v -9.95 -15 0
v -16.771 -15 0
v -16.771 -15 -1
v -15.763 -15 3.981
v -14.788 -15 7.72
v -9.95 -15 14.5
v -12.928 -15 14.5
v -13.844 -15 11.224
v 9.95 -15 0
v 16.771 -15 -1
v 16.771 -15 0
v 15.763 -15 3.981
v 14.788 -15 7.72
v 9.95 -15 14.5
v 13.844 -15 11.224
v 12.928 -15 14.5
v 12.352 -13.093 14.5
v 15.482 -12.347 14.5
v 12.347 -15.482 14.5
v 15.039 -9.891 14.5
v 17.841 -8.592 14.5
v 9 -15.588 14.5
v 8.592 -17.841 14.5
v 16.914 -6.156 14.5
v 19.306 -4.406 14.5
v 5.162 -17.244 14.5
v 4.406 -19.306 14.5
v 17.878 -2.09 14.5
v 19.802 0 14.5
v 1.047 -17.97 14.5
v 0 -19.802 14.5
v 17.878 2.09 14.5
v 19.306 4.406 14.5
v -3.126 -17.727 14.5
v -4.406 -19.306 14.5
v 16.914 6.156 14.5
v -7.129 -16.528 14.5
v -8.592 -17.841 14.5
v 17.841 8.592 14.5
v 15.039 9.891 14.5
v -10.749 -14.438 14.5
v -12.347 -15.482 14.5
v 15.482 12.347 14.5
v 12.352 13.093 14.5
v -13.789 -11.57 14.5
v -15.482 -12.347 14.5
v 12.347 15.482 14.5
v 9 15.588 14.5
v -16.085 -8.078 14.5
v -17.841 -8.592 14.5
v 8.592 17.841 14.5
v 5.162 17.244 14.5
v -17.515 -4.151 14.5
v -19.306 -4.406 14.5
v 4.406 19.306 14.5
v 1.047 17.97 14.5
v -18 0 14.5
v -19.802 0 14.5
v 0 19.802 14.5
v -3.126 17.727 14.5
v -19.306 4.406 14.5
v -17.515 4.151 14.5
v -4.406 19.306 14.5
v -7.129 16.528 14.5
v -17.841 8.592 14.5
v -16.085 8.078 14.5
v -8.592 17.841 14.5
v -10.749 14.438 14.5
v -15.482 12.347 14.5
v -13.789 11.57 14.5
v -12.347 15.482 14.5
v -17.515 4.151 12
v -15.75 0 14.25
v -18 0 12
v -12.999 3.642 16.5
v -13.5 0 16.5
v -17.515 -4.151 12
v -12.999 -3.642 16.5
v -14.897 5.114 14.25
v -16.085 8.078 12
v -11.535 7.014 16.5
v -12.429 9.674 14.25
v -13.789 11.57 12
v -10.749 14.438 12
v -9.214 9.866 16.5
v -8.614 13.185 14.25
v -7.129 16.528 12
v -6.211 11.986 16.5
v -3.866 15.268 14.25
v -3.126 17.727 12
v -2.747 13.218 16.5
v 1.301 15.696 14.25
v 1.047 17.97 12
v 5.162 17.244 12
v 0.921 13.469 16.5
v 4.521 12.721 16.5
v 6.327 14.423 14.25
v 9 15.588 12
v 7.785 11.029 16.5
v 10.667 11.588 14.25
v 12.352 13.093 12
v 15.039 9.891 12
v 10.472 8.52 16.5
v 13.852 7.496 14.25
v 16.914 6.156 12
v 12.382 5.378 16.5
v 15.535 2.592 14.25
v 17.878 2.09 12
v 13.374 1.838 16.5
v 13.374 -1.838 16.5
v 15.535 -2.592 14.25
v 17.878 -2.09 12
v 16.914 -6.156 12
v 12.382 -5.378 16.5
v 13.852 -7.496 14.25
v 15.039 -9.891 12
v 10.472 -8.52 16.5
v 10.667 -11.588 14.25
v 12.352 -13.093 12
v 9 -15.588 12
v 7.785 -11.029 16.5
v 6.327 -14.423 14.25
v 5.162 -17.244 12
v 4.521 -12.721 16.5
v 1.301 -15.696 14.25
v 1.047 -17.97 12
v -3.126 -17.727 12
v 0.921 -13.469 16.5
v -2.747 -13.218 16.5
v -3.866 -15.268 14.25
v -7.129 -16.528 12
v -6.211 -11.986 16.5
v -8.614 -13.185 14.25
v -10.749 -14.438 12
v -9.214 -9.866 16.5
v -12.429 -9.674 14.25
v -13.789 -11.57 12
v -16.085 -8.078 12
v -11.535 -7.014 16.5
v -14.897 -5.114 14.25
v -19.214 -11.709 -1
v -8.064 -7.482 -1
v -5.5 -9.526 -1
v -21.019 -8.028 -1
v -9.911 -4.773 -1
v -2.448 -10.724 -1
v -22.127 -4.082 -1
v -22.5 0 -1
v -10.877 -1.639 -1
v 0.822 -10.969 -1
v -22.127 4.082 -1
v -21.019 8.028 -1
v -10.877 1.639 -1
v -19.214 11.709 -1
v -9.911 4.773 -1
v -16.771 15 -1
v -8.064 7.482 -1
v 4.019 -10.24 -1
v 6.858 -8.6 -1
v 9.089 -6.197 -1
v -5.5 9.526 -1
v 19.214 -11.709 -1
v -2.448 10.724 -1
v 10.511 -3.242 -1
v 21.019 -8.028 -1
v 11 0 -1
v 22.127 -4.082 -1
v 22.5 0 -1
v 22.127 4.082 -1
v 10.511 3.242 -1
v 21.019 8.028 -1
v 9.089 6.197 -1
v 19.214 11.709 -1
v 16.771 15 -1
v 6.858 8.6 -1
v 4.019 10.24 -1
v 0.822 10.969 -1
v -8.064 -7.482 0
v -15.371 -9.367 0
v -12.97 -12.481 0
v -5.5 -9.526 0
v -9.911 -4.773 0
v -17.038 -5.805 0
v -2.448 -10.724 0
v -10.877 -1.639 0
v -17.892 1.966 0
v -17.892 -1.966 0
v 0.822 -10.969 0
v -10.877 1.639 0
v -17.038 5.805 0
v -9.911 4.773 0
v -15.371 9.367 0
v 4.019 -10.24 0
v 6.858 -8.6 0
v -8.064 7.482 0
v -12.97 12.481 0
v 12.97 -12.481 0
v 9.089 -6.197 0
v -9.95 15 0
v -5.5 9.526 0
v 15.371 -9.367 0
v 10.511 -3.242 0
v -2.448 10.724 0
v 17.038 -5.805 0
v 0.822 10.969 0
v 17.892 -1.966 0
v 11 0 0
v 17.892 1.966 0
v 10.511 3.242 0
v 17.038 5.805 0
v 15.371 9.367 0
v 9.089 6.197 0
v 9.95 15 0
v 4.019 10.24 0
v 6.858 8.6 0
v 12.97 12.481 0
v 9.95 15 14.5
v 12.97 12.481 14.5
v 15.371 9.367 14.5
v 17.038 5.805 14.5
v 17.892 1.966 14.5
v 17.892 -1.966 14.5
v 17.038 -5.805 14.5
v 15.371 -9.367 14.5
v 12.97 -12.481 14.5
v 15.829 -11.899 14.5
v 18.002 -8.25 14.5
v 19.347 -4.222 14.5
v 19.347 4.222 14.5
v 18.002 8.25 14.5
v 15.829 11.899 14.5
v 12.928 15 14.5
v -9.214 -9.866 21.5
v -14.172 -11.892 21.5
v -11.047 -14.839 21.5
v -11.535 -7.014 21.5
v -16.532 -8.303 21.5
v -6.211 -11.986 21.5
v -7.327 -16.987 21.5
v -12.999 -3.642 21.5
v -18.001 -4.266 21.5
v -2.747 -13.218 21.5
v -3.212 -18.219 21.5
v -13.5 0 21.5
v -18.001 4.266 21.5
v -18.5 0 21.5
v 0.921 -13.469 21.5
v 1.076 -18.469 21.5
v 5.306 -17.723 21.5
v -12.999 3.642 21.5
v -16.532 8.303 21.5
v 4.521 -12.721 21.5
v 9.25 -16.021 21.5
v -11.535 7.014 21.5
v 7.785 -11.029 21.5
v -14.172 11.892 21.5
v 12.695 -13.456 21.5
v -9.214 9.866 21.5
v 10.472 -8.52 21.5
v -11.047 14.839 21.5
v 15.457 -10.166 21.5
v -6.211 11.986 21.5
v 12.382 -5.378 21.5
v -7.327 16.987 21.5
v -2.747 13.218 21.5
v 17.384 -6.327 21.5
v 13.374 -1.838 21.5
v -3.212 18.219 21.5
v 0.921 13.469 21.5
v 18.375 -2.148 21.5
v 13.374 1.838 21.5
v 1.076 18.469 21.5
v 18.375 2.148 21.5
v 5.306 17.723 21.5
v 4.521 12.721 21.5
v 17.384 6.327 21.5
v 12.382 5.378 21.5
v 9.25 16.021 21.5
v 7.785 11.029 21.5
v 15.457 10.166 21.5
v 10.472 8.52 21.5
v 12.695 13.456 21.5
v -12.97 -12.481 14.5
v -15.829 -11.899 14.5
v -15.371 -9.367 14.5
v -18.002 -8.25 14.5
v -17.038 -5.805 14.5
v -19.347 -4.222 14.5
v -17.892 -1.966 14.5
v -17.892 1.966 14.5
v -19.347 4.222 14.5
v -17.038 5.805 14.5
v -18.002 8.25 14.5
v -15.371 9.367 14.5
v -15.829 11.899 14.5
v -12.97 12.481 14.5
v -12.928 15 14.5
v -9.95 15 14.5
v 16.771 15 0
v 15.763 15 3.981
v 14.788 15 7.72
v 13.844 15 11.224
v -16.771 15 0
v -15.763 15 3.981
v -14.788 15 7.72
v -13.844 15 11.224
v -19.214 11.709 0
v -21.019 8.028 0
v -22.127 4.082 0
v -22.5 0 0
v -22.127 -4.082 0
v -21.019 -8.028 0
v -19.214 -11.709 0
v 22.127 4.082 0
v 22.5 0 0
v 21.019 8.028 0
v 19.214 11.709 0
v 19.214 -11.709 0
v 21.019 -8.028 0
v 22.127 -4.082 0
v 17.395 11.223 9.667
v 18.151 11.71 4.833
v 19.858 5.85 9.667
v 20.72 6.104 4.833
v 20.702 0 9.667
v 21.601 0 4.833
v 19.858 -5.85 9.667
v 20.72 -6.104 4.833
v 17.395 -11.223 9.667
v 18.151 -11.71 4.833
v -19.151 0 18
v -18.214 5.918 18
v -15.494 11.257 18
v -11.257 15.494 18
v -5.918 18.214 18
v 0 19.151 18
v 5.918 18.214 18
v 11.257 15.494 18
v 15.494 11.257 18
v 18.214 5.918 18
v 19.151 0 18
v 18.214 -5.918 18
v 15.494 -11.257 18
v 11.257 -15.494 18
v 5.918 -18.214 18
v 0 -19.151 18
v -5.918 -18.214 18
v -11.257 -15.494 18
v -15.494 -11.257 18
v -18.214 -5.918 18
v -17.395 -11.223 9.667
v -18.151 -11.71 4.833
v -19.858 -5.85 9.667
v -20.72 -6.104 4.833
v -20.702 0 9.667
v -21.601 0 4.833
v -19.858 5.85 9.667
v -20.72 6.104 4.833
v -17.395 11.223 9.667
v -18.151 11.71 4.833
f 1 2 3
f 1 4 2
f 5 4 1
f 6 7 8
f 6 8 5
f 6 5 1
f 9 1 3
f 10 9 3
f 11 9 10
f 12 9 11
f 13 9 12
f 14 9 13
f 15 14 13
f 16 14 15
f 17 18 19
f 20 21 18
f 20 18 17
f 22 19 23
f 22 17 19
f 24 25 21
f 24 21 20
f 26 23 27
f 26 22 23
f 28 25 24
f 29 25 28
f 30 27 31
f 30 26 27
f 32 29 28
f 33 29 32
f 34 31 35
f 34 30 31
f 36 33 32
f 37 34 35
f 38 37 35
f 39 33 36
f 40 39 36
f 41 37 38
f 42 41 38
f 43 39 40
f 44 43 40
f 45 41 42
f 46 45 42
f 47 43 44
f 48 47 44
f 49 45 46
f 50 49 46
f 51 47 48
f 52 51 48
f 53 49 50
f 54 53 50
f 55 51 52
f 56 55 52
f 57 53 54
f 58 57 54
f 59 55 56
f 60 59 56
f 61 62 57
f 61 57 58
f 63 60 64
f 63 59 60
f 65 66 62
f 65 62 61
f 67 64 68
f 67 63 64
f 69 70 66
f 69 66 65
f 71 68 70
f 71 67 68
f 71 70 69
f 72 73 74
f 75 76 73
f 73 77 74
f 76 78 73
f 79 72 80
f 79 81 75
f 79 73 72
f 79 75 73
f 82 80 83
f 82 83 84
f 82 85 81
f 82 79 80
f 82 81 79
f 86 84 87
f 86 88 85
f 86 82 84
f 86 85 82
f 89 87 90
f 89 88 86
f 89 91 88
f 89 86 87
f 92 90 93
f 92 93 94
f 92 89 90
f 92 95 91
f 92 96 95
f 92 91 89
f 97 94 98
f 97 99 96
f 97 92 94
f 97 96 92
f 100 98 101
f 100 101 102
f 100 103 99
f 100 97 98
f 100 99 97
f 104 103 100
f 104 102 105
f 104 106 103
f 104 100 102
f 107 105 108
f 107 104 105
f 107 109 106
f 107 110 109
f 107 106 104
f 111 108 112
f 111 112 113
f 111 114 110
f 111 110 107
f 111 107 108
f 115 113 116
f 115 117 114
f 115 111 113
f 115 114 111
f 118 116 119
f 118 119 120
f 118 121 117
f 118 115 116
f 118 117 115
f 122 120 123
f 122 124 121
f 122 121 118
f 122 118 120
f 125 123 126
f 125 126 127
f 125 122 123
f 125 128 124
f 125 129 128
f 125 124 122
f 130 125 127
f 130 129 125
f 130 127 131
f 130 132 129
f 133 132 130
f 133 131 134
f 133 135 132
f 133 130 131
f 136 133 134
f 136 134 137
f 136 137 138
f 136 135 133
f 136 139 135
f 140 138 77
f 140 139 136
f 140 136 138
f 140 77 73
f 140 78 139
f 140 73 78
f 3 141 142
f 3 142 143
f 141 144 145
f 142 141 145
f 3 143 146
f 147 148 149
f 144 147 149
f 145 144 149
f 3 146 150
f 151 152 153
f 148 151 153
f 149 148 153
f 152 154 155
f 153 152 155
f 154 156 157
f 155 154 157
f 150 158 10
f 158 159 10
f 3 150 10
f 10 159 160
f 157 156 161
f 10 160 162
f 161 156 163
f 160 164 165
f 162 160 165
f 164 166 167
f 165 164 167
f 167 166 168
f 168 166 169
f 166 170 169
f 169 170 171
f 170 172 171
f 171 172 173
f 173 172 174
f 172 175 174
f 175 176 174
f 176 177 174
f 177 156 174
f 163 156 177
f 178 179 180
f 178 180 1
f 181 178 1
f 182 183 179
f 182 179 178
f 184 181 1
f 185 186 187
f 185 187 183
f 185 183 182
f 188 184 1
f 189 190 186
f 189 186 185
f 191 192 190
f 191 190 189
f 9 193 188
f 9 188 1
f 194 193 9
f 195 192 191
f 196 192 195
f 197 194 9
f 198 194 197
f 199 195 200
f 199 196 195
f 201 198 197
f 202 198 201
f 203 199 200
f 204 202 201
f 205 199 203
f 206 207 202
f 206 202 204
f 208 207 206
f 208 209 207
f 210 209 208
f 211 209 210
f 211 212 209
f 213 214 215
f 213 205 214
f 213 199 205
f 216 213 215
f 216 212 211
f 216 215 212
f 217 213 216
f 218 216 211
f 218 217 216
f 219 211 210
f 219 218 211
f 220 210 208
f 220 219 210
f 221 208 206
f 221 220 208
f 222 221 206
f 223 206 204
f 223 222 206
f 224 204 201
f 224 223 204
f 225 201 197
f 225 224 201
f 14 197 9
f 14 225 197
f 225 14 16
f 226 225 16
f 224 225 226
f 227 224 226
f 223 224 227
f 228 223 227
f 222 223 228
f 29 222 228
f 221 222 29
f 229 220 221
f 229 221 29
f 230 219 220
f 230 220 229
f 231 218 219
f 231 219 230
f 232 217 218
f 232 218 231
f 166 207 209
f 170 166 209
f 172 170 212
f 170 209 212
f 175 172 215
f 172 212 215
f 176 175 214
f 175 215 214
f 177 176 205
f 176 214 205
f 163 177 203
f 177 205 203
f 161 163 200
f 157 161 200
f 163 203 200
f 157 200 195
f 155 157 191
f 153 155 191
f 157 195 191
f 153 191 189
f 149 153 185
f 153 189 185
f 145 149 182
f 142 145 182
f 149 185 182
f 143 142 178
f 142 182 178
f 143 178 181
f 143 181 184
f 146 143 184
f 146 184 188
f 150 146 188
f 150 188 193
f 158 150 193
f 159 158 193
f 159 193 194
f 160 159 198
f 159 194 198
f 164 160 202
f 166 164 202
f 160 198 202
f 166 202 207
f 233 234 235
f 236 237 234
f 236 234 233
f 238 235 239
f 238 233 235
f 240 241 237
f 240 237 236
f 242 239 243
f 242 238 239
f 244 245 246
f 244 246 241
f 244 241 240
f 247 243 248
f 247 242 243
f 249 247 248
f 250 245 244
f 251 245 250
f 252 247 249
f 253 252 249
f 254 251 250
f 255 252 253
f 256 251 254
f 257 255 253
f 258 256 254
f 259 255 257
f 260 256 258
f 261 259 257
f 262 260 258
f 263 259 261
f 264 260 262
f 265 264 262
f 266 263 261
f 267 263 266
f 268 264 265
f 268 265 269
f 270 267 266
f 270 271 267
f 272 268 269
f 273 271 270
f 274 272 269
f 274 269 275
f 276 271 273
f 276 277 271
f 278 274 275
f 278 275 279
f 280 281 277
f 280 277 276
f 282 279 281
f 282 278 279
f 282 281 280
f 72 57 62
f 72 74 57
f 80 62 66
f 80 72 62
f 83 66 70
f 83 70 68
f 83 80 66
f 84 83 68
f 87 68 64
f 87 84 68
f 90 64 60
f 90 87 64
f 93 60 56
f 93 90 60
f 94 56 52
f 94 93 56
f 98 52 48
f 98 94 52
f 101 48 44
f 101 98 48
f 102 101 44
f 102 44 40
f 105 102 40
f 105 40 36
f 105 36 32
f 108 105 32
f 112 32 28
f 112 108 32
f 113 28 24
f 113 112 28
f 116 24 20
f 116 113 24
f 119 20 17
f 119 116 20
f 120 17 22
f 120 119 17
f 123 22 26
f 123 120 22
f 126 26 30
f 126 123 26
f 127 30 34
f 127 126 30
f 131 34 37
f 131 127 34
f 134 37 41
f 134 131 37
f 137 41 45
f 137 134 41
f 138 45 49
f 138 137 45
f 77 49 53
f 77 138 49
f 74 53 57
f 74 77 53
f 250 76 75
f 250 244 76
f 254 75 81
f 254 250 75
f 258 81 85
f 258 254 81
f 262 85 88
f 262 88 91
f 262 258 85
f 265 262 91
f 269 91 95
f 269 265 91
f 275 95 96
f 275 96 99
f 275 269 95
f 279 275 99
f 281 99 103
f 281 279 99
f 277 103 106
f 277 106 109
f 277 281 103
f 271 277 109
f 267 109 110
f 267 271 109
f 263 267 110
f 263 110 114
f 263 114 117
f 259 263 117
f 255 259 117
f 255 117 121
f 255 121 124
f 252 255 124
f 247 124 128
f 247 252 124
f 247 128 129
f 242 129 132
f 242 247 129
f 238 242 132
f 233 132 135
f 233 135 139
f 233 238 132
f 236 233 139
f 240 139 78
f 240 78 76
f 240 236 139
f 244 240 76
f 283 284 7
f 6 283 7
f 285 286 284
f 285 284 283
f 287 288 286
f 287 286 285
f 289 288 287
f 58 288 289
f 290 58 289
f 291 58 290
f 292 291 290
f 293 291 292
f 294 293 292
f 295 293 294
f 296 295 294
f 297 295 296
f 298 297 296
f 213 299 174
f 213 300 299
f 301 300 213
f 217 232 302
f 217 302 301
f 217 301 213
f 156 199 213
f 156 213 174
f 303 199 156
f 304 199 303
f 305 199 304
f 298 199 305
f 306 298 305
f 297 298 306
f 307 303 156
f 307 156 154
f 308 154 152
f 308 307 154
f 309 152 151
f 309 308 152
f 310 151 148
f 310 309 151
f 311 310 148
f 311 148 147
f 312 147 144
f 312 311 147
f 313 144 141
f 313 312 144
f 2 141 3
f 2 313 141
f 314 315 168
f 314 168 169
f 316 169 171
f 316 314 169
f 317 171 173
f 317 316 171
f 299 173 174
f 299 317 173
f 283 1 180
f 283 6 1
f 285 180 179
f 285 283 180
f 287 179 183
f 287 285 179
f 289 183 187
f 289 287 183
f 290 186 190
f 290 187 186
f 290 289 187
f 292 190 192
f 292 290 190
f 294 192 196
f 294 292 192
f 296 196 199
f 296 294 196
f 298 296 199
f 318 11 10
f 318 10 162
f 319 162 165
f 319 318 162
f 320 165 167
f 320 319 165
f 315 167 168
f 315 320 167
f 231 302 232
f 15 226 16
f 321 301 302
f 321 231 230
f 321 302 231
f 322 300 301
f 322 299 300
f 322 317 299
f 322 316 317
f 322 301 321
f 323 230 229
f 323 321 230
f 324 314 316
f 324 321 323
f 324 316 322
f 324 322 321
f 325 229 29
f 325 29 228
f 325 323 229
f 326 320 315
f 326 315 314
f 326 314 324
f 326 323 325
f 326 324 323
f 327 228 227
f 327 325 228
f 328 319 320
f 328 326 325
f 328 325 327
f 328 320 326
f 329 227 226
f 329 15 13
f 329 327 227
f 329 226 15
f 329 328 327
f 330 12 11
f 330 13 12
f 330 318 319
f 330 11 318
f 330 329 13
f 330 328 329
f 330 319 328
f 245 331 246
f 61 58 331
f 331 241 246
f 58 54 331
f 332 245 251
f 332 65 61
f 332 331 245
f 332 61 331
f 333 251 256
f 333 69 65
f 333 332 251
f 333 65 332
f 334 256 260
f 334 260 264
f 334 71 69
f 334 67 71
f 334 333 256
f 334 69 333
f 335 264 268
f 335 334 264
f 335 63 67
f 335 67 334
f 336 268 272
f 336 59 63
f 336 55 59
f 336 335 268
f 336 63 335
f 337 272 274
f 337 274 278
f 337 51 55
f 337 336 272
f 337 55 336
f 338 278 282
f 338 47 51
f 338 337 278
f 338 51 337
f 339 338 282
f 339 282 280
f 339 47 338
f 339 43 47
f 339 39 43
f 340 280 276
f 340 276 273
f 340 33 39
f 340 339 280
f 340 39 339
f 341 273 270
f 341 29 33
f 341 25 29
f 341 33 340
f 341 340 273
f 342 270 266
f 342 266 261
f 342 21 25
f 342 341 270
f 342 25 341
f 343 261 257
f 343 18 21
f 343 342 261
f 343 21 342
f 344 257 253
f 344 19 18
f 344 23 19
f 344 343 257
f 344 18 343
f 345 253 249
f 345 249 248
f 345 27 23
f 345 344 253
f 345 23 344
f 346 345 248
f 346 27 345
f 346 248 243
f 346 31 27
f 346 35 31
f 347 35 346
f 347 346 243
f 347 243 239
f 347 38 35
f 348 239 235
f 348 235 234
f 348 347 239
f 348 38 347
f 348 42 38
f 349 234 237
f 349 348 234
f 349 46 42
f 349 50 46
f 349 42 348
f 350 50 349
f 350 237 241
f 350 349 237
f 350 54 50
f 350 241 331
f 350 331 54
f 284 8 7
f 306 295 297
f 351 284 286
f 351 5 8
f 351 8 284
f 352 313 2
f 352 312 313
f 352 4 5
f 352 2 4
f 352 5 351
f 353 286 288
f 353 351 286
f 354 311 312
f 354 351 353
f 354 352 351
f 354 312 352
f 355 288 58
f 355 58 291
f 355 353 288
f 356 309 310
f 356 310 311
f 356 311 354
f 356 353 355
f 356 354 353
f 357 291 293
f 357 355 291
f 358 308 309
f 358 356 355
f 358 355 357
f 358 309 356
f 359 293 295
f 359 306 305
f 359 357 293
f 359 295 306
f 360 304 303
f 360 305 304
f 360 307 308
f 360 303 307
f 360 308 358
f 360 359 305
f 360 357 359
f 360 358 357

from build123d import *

# Parameters (mm, degrees)
F0_R     = 11
F3_DEPTH = 25
F4_DEPTH = 1


with BuildPart() as f2:
    # F1 (on Front) → F2 (revolve)
    with BuildSketch(Plane.XZ):
        Polygon((-22.5, 0), (-18, 0), (-18, 12), (-18, 14.5), (-19.802326, 14.5), align=None)
    revolve(axis=Axis((0, 0, 2.402903), (0, 0, -1)))

    # F0 (on Top) → F3 (intersect)
    with BuildSketch(Plane.XY):
        with BuildLine():
            ThreePointArc((22.5, 0), (21.018878, -8.028497), (16.77051, -15))
            Line((16.77051, -15), (22.5, -15))
            Line((22.5, -15), (22.5, 0))
        make_face()
        with BuildLine():
            ThreePointArc((-9.949874, -15), (-18, 0), (-9.949874, 15))
            Line((-9.949874, 15), (-16.77051, 15))
            ThreePointArc((-16.77051, 15), (-21.018878, 8.028497), (-22.5, 0))
            ThreePointArc((-22.5, 0), (-21.018878, -8.028497), (-16.77051, -15))
            Line((-16.77051, -15), (-9.949874, -15))
        make_face()
        with BuildLine():
            Line((22.5, 15), (16.77051, 15))
            ThreePointArc((16.77051, 15), (21.018878, 8.028497), (22.5, 0))
            Line((22.5, 0), (22.5, 15))
        make_face()
        with BuildLine():
            ThreePointArc((9.949874, -15), (15.860292, -8.511823), (18, 0))
            ThreePointArc((18, 0), (15.860292, 8.511823), (9.949874, 15))
            Line((9.949874, 15), (-9.949874, 15))
            ThreePointArc((-9.949874, 15), (-18, 0), (-9.949874, -15))
            Line((-9.949874, -15), (9.949874, -15))
        make_face()
        Circle(F0_R, mode=Mode.SUBTRACT)
        Circle(F0_R)
        with BuildLine():
            ThreePointArc((9.949874, 15), (15.860292, 8.511823), (18, 0))
            ThreePointArc((18, 0), (15.860292, -8.511823), (9.949874, -15))
            Line((9.949874, -15), (16.77051, -15))
            ThreePointArc((16.77051, -15), (21.018878, -8.028497), (22.5, 0))
            ThreePointArc((22.5, 0), (21.018878, 8.028497), (16.77051, 15))
            Line((16.77051, 15), (9.949874, 15))
        make_face()
    extrude(amount=F3_DEPTH, mode=Mode.INTERSECT)

    # F0 (on Top) → F4 (join)
    with BuildSketch(Plane.XY):
        with BuildLine():
            ThreePointArc((-9.949874, -15), (-18, 0), (-9.949874, 15))
            Line((-9.949874, 15), (-16.77051, 15))
            ThreePointArc((-16.77051, 15), (-21.018878, 8.028497), (-22.5, 0))
            ThreePointArc((-22.5, 0), (-21.018878, -8.028497), (-16.77051, -15))
            Line((-16.77051, -15), (-9.949874, -15))
        make_face()
        with BuildLine():
            ThreePointArc((9.949874, -15), (15.860292, -8.511823), (18, 0))
            ThreePointArc((18, 0), (15.860292, 8.511823), (9.949874, 15))
            Line((9.949874, 15), (-9.949874, 15))
            ThreePointArc((-9.949874, 15), (-18, 0), (-9.949874, -15))
            Line((-9.949874, -15), (9.949874, -15))
        make_face()
        Circle(F0_R, mode=Mode.SUBTRACT)
        with BuildLine():
            ThreePointArc((9.949874, 15), (15.860292, 8.511823), (18, 0))
            ThreePointArc((18, 0), (15.860292, -8.511823), (9.949874, -15))
            Line((9.949874, -15), (16.77051, -15))
            ThreePointArc((16.77051, -15), (21.018878, -8.028497), (22.5, 0))
            ThreePointArc((22.5, 0), (21.018878, 8.028497), (16.77051, 15))
            Line((16.77051, 15), (9.949874, 15))
        make_face()
    extrude(amount=-F4_DEPTH)


with BuildPart() as f5:
    # F1 (on Front) → F5 (revolve)
    with BuildSketch(Plane.XZ):
        Polygon((-18, 14.5), (-18, 12), (-13.5, 16.5), (-13.5, 21.5), (-18.5, 21.5), (-19.802326, 14.5), align=None)
    revolve(axis=Axis((0, 0, 2.402903), (0, 0, -1)))


solid = Compound([f2.part, f5.part])
